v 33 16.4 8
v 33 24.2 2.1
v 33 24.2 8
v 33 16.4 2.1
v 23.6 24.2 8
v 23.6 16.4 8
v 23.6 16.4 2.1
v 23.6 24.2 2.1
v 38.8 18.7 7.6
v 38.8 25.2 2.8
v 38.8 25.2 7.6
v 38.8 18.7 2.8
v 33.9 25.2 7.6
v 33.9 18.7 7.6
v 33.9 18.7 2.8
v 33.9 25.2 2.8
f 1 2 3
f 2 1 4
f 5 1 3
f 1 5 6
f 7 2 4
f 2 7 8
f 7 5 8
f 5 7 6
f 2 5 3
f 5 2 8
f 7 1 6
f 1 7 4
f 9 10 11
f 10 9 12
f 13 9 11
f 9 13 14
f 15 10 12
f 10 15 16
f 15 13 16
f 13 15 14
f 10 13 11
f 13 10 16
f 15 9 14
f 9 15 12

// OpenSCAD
union() {
  translate([23.6, 16.4, 2.1]) cube(size=[9.4,7.8,5.9], center=false);
  translate([33.9, 18.7, 2.8]) cube(size=[4.9,6.5,4.8], center=false);
}
